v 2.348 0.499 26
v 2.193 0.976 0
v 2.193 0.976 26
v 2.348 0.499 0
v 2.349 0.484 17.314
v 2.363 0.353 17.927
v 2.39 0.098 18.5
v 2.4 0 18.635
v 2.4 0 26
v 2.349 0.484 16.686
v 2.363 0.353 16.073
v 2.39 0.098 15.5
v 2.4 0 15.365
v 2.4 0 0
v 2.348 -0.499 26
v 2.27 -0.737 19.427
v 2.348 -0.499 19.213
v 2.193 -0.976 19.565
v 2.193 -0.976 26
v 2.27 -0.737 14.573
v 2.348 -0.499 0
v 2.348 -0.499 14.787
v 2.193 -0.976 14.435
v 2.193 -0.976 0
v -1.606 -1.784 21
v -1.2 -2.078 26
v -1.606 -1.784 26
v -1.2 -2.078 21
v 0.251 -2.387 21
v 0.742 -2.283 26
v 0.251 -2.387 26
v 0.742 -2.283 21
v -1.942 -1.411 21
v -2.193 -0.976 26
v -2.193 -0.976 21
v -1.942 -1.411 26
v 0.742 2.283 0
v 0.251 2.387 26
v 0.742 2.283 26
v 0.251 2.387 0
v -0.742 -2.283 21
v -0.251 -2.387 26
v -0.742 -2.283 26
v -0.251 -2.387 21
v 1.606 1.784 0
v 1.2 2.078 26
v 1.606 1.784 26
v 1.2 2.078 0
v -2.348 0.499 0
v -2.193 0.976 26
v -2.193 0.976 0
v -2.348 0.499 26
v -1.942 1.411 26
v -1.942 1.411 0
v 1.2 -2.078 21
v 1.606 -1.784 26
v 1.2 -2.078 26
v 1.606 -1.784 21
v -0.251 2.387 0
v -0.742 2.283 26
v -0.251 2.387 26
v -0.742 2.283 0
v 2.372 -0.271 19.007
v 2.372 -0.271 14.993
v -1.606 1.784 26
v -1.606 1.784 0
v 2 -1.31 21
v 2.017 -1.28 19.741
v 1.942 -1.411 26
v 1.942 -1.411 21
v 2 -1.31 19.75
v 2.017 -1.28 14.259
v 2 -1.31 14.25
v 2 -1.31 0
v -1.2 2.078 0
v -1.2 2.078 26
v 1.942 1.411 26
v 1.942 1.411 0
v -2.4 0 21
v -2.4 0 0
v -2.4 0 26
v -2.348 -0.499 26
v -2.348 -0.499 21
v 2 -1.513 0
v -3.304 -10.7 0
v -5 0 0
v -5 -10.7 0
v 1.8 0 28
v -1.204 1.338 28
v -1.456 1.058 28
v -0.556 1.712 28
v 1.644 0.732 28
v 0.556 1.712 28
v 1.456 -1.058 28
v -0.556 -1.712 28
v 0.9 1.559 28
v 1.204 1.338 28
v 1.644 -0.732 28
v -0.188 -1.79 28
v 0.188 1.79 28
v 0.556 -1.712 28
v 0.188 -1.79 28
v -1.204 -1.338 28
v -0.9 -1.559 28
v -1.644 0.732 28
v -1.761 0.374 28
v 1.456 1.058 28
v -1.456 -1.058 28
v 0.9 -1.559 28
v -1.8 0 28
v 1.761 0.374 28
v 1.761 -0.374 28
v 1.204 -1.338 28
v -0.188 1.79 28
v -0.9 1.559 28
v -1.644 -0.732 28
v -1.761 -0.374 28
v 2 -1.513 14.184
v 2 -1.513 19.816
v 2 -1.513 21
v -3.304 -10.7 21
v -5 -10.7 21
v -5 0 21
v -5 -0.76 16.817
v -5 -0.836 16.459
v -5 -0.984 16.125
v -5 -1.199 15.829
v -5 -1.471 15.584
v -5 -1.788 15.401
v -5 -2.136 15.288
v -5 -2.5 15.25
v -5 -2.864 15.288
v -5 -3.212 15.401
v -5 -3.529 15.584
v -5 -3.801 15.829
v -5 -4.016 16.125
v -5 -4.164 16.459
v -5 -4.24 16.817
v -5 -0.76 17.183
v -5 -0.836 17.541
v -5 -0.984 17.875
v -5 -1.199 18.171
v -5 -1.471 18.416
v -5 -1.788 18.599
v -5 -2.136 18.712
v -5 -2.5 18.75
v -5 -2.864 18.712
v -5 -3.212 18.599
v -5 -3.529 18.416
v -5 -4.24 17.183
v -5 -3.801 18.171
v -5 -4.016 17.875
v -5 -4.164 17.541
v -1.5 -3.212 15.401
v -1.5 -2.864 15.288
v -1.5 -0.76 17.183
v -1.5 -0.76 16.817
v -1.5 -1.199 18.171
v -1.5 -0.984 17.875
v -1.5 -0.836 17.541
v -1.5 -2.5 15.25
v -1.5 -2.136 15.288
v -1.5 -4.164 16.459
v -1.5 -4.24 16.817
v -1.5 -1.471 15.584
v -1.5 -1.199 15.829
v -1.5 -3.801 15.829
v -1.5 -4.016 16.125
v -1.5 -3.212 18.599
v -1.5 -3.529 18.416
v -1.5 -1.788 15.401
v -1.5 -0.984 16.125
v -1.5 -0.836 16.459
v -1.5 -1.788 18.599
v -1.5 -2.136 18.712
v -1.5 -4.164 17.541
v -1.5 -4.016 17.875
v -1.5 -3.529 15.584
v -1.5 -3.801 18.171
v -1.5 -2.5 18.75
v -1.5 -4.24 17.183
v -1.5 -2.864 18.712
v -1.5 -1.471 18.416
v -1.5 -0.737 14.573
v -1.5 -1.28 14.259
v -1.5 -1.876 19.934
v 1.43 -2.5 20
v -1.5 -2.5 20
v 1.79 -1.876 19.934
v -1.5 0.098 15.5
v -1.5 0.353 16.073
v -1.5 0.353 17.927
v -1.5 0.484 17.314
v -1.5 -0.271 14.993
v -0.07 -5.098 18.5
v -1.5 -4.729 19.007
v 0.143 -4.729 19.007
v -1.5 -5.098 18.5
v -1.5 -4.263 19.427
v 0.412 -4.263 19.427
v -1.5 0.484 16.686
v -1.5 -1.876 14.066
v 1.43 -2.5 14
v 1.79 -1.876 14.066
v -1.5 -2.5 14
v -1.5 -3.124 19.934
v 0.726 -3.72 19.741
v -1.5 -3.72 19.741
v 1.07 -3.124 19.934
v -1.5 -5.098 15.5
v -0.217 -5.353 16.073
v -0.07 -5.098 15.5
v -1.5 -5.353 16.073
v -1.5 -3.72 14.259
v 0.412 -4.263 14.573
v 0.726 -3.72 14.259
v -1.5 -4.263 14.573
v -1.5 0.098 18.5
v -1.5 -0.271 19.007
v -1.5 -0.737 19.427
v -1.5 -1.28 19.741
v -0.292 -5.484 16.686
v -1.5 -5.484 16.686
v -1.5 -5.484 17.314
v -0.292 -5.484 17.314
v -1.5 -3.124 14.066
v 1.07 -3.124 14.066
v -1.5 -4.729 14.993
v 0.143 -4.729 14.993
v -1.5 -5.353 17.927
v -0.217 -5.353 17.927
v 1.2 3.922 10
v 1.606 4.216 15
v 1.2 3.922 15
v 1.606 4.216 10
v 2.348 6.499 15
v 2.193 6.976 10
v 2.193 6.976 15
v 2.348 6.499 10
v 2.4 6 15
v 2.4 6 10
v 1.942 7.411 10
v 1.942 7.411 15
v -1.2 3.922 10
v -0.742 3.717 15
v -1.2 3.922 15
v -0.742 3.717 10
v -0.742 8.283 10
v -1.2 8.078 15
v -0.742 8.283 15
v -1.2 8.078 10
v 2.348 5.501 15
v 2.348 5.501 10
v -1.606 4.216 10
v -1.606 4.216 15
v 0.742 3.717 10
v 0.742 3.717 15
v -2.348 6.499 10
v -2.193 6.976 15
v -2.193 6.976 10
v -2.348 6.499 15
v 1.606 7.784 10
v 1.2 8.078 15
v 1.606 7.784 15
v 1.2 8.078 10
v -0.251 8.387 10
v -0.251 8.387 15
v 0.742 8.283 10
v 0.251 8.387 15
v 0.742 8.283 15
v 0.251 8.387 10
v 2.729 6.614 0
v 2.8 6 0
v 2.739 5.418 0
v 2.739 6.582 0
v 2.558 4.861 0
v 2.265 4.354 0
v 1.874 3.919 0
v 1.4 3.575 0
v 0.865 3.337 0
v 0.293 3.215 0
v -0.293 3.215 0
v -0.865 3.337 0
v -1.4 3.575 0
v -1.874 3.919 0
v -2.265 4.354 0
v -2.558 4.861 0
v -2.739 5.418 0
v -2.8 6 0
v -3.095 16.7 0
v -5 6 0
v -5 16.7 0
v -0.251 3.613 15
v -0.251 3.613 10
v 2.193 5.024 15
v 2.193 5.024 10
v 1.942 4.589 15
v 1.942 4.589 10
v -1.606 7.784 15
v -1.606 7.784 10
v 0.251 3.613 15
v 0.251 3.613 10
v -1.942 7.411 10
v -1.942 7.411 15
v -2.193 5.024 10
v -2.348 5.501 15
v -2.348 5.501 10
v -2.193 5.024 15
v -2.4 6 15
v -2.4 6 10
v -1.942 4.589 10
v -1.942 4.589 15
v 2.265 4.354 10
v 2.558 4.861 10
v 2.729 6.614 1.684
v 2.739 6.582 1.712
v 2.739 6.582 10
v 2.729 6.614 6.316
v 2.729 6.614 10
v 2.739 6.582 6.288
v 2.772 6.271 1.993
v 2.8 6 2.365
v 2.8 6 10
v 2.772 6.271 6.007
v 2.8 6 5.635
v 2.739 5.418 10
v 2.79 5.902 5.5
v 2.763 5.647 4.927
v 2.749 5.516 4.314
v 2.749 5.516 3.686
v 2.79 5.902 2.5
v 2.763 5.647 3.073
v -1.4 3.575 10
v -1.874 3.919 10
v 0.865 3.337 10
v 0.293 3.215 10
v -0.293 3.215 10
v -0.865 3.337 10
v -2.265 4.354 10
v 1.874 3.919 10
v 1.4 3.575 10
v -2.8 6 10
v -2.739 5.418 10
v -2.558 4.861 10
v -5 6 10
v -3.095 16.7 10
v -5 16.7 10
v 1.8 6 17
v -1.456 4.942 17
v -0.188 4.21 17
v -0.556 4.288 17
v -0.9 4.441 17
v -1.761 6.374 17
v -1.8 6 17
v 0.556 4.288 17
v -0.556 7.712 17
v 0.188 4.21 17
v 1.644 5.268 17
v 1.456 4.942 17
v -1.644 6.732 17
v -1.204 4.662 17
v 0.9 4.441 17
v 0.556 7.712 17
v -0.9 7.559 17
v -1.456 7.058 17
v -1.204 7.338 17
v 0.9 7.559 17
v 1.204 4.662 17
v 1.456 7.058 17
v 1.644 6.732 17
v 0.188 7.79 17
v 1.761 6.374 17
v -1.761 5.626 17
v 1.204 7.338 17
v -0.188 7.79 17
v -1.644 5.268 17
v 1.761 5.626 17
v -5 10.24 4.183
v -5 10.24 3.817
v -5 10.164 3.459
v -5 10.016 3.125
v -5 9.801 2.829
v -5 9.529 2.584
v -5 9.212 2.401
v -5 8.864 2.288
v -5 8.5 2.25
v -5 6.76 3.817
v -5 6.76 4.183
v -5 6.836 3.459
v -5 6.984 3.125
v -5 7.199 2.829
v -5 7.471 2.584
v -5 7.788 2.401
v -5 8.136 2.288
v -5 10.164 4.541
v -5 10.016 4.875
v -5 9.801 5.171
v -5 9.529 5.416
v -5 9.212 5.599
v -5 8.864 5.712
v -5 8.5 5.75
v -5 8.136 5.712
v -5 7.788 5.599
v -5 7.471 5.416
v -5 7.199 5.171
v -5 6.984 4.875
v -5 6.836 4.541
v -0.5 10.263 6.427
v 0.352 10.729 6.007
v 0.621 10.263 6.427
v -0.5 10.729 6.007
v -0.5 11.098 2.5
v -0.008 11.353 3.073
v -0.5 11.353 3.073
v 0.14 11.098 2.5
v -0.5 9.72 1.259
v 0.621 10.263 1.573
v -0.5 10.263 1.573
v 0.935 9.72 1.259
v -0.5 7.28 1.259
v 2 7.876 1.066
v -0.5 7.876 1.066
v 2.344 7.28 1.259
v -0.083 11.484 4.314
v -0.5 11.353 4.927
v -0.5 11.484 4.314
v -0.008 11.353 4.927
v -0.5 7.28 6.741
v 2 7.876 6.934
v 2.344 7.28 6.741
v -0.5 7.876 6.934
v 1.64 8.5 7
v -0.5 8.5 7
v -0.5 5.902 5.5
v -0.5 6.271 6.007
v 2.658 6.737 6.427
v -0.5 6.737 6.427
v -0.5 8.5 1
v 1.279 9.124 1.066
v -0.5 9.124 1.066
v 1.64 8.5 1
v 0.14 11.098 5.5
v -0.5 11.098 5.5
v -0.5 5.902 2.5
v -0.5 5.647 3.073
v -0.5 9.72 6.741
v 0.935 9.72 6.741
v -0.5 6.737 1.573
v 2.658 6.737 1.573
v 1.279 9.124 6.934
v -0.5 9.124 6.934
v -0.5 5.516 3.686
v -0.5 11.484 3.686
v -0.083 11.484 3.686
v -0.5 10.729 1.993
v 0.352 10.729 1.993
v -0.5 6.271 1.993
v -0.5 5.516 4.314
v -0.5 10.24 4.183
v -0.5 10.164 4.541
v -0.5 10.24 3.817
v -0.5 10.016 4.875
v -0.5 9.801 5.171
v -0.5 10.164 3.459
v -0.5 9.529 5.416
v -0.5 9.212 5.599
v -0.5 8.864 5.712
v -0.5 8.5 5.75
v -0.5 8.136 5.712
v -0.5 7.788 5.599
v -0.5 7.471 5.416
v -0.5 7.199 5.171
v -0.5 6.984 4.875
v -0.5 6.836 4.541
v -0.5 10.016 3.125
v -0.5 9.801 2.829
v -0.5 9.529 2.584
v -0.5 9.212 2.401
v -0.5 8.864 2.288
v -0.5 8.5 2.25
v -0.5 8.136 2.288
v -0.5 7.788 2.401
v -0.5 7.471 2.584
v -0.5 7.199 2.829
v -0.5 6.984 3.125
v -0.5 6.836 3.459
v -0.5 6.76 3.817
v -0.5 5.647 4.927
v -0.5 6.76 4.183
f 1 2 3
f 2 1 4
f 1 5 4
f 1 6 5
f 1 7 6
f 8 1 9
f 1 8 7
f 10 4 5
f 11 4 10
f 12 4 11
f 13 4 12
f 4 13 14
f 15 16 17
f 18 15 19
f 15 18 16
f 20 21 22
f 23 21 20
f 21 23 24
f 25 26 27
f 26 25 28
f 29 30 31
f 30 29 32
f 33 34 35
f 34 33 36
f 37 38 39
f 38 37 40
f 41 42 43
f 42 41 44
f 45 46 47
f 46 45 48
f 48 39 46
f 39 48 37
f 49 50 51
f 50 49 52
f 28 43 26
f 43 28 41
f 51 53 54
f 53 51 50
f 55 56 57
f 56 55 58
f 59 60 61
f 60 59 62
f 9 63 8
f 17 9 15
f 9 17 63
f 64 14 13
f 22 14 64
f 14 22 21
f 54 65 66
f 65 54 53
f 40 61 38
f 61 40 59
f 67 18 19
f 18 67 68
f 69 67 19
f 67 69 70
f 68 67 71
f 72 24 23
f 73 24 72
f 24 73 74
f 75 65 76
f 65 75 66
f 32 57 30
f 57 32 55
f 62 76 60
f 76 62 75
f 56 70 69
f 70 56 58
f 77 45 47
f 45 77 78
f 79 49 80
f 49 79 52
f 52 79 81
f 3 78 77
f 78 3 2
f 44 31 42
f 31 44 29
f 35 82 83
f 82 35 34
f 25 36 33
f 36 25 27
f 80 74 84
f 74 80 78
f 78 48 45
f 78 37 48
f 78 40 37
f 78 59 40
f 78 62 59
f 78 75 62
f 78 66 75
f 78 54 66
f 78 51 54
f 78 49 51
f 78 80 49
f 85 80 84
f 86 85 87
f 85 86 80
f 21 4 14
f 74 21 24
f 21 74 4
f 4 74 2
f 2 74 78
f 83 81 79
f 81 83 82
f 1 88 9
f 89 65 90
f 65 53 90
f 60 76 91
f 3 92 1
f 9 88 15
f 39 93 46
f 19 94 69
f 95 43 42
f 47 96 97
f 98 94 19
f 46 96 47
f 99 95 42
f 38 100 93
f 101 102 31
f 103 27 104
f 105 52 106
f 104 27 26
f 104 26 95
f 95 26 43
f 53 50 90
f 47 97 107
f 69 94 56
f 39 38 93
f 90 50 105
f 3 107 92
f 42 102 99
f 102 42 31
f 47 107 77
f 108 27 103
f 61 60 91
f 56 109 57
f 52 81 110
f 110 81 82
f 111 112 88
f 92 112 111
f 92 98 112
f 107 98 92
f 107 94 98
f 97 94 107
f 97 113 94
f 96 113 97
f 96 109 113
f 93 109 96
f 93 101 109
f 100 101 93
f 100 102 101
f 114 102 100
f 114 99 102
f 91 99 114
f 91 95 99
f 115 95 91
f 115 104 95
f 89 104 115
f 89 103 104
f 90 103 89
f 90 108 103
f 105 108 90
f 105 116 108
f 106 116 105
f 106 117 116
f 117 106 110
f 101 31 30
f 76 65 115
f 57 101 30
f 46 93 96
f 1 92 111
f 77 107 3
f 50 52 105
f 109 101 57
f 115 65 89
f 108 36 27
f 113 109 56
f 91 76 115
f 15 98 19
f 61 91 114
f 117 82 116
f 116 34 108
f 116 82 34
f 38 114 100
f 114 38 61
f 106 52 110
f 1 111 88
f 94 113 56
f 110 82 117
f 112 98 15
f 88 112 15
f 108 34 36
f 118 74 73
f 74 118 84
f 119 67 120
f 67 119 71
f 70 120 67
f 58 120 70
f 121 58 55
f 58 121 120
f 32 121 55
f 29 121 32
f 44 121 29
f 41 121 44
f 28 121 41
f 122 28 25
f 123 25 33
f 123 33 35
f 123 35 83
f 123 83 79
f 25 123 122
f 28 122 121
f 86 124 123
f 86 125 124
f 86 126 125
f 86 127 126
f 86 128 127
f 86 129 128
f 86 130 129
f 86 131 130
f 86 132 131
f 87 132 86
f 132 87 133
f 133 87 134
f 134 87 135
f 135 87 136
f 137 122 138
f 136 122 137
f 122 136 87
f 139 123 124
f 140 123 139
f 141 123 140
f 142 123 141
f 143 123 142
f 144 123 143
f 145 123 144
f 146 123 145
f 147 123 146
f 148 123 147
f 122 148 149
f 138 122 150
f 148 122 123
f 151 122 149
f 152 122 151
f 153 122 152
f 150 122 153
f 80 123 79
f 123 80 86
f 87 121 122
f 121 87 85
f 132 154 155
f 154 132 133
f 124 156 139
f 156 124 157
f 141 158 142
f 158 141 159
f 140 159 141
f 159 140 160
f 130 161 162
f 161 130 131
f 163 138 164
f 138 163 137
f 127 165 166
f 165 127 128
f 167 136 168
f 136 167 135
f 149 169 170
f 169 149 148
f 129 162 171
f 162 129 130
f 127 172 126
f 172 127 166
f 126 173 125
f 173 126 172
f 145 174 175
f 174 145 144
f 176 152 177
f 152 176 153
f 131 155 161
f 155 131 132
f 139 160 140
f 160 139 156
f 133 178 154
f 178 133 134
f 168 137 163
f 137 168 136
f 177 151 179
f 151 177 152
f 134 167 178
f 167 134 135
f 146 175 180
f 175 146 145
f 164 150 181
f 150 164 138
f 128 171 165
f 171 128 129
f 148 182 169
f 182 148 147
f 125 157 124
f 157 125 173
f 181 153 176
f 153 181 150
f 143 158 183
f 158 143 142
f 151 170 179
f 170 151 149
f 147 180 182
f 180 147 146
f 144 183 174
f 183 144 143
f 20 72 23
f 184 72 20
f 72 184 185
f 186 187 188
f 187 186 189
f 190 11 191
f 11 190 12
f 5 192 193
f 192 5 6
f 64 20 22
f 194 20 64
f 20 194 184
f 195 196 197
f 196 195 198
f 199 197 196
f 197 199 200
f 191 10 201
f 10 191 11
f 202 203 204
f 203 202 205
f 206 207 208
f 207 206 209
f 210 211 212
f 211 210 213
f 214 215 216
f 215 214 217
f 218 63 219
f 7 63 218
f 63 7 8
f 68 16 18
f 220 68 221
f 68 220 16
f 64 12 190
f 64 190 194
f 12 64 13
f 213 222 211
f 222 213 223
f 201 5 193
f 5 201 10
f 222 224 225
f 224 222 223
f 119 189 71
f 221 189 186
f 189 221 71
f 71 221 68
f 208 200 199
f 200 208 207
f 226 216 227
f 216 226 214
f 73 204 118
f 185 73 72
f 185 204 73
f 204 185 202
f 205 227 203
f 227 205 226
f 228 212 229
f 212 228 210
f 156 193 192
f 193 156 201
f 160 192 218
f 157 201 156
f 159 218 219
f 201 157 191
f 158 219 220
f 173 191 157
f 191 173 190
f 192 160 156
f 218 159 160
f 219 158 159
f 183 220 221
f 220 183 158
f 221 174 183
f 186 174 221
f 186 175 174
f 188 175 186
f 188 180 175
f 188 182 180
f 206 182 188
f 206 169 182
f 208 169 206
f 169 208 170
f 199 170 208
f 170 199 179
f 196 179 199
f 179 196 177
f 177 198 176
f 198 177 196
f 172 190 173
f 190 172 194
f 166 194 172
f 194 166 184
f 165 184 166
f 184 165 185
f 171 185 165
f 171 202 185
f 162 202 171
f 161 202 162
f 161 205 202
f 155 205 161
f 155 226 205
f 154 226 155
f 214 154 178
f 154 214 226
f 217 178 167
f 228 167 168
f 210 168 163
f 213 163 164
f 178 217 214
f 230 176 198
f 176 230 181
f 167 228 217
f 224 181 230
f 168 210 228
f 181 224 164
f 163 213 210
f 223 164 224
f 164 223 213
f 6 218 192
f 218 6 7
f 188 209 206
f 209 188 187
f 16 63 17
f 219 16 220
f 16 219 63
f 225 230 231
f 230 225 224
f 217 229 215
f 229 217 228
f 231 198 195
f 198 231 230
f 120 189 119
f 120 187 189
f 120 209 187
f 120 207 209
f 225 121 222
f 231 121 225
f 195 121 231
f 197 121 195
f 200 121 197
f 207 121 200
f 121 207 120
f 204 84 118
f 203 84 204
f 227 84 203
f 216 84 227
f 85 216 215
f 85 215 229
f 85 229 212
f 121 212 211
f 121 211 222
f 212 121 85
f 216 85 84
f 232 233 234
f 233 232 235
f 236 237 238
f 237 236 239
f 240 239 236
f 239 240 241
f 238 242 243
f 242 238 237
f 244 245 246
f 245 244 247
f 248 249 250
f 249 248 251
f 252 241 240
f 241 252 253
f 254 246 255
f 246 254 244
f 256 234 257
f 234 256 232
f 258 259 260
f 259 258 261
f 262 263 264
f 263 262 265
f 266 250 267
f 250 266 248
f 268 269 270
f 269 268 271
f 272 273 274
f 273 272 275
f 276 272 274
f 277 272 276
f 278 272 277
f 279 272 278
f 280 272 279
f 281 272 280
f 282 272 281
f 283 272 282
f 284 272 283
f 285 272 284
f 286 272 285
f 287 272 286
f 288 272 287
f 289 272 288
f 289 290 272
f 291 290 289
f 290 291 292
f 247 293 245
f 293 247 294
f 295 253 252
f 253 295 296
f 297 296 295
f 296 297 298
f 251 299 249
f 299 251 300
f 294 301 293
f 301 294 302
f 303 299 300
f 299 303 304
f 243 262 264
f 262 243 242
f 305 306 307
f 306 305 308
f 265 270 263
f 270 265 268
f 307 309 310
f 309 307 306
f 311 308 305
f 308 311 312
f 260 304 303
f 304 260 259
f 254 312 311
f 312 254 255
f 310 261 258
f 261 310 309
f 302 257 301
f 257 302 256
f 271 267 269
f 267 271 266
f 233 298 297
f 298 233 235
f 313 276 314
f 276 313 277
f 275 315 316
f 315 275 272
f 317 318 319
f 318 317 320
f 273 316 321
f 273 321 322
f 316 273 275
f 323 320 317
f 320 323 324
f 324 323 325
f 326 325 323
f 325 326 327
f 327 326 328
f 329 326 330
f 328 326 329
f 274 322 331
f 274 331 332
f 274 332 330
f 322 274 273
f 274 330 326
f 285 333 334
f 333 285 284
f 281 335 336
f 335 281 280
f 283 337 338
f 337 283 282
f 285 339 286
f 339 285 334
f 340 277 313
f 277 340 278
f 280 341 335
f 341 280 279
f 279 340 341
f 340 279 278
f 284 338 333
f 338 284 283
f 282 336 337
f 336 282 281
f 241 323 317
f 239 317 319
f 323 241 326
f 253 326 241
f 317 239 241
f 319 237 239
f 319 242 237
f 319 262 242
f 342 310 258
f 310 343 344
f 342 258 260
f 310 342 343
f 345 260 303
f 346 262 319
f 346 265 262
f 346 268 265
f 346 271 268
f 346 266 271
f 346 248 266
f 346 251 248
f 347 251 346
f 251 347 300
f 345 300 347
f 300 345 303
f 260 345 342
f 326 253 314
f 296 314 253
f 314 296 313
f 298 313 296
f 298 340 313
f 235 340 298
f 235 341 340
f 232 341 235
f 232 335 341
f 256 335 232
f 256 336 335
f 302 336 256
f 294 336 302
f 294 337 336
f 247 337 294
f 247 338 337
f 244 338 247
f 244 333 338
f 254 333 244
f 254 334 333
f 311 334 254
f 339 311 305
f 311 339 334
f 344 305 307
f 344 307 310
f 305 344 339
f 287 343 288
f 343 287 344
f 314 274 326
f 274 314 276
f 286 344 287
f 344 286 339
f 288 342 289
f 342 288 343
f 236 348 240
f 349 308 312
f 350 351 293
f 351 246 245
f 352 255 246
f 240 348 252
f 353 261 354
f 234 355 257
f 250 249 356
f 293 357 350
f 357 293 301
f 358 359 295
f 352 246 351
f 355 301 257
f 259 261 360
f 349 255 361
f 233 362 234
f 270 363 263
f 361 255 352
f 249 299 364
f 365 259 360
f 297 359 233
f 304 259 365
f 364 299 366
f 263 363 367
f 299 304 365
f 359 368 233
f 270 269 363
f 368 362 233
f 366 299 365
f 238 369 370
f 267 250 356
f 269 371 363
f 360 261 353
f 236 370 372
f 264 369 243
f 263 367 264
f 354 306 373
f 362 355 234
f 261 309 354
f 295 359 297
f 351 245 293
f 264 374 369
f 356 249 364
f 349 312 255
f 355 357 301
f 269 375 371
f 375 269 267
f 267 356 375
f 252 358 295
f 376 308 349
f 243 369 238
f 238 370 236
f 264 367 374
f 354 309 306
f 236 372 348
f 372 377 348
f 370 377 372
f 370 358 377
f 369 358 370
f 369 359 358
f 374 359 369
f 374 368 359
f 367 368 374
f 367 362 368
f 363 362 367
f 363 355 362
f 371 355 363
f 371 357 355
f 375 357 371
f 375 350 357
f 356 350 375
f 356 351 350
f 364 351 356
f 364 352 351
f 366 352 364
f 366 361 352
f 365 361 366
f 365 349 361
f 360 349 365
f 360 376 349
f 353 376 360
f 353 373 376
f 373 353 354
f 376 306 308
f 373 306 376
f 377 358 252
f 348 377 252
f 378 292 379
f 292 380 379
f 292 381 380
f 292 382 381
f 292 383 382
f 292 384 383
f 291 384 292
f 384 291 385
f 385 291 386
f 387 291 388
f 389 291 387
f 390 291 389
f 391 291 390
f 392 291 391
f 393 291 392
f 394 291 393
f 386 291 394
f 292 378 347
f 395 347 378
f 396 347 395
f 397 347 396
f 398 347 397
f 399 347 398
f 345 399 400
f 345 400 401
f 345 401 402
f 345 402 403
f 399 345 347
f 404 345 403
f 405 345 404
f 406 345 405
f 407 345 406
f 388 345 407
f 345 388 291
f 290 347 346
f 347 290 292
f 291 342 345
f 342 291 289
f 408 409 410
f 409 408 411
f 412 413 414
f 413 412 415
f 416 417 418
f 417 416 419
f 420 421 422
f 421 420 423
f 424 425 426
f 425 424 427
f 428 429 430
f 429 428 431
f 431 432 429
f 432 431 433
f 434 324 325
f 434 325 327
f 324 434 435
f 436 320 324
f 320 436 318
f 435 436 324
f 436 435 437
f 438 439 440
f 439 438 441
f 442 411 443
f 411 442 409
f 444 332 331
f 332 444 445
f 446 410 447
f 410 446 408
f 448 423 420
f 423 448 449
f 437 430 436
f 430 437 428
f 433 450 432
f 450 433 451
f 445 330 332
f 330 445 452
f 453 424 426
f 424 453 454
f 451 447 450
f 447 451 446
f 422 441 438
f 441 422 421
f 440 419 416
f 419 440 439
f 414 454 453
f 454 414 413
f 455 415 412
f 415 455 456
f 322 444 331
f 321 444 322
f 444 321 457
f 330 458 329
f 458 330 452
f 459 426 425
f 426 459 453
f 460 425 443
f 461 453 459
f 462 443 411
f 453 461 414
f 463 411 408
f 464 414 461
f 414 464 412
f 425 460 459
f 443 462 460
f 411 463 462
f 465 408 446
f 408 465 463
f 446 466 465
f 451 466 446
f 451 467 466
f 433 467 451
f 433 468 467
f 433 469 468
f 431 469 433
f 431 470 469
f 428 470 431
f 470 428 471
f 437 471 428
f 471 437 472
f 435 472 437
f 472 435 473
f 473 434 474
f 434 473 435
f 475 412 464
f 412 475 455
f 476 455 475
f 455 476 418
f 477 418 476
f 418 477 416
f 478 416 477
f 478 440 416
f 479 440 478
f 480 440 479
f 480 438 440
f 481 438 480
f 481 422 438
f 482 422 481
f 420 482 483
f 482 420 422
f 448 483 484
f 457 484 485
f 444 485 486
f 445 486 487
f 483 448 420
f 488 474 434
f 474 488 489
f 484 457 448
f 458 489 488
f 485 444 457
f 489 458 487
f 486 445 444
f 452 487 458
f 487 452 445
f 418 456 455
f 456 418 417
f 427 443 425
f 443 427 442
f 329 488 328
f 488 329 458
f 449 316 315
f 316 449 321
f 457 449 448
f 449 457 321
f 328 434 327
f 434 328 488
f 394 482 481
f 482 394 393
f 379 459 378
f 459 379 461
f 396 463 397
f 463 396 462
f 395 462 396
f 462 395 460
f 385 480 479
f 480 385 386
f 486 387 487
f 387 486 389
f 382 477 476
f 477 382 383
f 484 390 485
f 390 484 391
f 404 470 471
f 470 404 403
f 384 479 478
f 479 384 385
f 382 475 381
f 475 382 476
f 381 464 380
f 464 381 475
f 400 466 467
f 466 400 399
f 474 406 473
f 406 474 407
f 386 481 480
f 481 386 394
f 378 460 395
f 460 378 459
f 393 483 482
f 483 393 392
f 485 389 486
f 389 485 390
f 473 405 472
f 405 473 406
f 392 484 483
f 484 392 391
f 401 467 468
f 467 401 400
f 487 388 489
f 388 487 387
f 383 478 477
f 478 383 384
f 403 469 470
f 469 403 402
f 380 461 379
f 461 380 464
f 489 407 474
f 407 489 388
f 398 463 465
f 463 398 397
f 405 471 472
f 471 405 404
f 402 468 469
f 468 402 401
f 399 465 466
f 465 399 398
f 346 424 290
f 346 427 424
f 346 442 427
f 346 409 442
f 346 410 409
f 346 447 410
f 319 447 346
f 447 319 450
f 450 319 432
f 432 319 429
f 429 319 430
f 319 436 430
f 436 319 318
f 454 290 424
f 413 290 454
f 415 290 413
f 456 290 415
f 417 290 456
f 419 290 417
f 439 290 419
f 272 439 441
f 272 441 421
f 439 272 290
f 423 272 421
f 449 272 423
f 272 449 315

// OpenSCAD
// PRUSA iteration4
// Einsy cover hinges
// GNU GPL v3
// Josef Průša <iam@josefprusa.cz> and contributors
// http://www.reprap.org/wiki/Prusa_Mendel
// http://prusamendel.org

module upper_hinge(){
    difference(){
        union(){
            // Body
            cylinder(h=26,r=2.4,$fn=30);
            translate([0,0,26]) cylinder(h=2,r1=2.4,r2=1.8,$fn=30);
            translate([-5,-10.7,0]) cube([7,10.7,21]);
        }

        // M3 screw hole
        translate([-12.5,-2.5,17]) rotate([0,90,0]) cylinder(h=20,r=1.75,$fn=30);
        translate([-1.5,-2.5,17]) rotate([0,90,0]) cylinder(h=9,r=3,$fn=30);

        // Angle cut
        translate([-2.9,-20,-1]) rotate([0,0,60]) cube([25,5,26]);
    }
}

module lower_hinge(){
    difference(){
        union(){
            // Body
            translate([0,6,0]) cylinder(h=15,r=2.4,$fn=30);
            translate([0,6,0]) cylinder(h=10,r=2.8,$fn=30);
            translate([0,6,15]) cylinder(h=2,r1=2.4,r2=1.8,$fn=30);
            translate([-5,6,0]) cube([7,10.7,10]);
        }

        // M3 screw
        translate([-0.5,8.5,4]) rotate([0,90,0]) cylinder(h=20,r=3,$fn=30);
        translate([-12,8.5,4]) rotate([0,90,0]) cylinder(h=20,r=1.75,$fn=30);

        // Angle cut
        translate([-5,20,-1]) rotate([0,0,-60]) cube([20,5,20]);
    }
}

upper_hinge();
lower_hinge();
